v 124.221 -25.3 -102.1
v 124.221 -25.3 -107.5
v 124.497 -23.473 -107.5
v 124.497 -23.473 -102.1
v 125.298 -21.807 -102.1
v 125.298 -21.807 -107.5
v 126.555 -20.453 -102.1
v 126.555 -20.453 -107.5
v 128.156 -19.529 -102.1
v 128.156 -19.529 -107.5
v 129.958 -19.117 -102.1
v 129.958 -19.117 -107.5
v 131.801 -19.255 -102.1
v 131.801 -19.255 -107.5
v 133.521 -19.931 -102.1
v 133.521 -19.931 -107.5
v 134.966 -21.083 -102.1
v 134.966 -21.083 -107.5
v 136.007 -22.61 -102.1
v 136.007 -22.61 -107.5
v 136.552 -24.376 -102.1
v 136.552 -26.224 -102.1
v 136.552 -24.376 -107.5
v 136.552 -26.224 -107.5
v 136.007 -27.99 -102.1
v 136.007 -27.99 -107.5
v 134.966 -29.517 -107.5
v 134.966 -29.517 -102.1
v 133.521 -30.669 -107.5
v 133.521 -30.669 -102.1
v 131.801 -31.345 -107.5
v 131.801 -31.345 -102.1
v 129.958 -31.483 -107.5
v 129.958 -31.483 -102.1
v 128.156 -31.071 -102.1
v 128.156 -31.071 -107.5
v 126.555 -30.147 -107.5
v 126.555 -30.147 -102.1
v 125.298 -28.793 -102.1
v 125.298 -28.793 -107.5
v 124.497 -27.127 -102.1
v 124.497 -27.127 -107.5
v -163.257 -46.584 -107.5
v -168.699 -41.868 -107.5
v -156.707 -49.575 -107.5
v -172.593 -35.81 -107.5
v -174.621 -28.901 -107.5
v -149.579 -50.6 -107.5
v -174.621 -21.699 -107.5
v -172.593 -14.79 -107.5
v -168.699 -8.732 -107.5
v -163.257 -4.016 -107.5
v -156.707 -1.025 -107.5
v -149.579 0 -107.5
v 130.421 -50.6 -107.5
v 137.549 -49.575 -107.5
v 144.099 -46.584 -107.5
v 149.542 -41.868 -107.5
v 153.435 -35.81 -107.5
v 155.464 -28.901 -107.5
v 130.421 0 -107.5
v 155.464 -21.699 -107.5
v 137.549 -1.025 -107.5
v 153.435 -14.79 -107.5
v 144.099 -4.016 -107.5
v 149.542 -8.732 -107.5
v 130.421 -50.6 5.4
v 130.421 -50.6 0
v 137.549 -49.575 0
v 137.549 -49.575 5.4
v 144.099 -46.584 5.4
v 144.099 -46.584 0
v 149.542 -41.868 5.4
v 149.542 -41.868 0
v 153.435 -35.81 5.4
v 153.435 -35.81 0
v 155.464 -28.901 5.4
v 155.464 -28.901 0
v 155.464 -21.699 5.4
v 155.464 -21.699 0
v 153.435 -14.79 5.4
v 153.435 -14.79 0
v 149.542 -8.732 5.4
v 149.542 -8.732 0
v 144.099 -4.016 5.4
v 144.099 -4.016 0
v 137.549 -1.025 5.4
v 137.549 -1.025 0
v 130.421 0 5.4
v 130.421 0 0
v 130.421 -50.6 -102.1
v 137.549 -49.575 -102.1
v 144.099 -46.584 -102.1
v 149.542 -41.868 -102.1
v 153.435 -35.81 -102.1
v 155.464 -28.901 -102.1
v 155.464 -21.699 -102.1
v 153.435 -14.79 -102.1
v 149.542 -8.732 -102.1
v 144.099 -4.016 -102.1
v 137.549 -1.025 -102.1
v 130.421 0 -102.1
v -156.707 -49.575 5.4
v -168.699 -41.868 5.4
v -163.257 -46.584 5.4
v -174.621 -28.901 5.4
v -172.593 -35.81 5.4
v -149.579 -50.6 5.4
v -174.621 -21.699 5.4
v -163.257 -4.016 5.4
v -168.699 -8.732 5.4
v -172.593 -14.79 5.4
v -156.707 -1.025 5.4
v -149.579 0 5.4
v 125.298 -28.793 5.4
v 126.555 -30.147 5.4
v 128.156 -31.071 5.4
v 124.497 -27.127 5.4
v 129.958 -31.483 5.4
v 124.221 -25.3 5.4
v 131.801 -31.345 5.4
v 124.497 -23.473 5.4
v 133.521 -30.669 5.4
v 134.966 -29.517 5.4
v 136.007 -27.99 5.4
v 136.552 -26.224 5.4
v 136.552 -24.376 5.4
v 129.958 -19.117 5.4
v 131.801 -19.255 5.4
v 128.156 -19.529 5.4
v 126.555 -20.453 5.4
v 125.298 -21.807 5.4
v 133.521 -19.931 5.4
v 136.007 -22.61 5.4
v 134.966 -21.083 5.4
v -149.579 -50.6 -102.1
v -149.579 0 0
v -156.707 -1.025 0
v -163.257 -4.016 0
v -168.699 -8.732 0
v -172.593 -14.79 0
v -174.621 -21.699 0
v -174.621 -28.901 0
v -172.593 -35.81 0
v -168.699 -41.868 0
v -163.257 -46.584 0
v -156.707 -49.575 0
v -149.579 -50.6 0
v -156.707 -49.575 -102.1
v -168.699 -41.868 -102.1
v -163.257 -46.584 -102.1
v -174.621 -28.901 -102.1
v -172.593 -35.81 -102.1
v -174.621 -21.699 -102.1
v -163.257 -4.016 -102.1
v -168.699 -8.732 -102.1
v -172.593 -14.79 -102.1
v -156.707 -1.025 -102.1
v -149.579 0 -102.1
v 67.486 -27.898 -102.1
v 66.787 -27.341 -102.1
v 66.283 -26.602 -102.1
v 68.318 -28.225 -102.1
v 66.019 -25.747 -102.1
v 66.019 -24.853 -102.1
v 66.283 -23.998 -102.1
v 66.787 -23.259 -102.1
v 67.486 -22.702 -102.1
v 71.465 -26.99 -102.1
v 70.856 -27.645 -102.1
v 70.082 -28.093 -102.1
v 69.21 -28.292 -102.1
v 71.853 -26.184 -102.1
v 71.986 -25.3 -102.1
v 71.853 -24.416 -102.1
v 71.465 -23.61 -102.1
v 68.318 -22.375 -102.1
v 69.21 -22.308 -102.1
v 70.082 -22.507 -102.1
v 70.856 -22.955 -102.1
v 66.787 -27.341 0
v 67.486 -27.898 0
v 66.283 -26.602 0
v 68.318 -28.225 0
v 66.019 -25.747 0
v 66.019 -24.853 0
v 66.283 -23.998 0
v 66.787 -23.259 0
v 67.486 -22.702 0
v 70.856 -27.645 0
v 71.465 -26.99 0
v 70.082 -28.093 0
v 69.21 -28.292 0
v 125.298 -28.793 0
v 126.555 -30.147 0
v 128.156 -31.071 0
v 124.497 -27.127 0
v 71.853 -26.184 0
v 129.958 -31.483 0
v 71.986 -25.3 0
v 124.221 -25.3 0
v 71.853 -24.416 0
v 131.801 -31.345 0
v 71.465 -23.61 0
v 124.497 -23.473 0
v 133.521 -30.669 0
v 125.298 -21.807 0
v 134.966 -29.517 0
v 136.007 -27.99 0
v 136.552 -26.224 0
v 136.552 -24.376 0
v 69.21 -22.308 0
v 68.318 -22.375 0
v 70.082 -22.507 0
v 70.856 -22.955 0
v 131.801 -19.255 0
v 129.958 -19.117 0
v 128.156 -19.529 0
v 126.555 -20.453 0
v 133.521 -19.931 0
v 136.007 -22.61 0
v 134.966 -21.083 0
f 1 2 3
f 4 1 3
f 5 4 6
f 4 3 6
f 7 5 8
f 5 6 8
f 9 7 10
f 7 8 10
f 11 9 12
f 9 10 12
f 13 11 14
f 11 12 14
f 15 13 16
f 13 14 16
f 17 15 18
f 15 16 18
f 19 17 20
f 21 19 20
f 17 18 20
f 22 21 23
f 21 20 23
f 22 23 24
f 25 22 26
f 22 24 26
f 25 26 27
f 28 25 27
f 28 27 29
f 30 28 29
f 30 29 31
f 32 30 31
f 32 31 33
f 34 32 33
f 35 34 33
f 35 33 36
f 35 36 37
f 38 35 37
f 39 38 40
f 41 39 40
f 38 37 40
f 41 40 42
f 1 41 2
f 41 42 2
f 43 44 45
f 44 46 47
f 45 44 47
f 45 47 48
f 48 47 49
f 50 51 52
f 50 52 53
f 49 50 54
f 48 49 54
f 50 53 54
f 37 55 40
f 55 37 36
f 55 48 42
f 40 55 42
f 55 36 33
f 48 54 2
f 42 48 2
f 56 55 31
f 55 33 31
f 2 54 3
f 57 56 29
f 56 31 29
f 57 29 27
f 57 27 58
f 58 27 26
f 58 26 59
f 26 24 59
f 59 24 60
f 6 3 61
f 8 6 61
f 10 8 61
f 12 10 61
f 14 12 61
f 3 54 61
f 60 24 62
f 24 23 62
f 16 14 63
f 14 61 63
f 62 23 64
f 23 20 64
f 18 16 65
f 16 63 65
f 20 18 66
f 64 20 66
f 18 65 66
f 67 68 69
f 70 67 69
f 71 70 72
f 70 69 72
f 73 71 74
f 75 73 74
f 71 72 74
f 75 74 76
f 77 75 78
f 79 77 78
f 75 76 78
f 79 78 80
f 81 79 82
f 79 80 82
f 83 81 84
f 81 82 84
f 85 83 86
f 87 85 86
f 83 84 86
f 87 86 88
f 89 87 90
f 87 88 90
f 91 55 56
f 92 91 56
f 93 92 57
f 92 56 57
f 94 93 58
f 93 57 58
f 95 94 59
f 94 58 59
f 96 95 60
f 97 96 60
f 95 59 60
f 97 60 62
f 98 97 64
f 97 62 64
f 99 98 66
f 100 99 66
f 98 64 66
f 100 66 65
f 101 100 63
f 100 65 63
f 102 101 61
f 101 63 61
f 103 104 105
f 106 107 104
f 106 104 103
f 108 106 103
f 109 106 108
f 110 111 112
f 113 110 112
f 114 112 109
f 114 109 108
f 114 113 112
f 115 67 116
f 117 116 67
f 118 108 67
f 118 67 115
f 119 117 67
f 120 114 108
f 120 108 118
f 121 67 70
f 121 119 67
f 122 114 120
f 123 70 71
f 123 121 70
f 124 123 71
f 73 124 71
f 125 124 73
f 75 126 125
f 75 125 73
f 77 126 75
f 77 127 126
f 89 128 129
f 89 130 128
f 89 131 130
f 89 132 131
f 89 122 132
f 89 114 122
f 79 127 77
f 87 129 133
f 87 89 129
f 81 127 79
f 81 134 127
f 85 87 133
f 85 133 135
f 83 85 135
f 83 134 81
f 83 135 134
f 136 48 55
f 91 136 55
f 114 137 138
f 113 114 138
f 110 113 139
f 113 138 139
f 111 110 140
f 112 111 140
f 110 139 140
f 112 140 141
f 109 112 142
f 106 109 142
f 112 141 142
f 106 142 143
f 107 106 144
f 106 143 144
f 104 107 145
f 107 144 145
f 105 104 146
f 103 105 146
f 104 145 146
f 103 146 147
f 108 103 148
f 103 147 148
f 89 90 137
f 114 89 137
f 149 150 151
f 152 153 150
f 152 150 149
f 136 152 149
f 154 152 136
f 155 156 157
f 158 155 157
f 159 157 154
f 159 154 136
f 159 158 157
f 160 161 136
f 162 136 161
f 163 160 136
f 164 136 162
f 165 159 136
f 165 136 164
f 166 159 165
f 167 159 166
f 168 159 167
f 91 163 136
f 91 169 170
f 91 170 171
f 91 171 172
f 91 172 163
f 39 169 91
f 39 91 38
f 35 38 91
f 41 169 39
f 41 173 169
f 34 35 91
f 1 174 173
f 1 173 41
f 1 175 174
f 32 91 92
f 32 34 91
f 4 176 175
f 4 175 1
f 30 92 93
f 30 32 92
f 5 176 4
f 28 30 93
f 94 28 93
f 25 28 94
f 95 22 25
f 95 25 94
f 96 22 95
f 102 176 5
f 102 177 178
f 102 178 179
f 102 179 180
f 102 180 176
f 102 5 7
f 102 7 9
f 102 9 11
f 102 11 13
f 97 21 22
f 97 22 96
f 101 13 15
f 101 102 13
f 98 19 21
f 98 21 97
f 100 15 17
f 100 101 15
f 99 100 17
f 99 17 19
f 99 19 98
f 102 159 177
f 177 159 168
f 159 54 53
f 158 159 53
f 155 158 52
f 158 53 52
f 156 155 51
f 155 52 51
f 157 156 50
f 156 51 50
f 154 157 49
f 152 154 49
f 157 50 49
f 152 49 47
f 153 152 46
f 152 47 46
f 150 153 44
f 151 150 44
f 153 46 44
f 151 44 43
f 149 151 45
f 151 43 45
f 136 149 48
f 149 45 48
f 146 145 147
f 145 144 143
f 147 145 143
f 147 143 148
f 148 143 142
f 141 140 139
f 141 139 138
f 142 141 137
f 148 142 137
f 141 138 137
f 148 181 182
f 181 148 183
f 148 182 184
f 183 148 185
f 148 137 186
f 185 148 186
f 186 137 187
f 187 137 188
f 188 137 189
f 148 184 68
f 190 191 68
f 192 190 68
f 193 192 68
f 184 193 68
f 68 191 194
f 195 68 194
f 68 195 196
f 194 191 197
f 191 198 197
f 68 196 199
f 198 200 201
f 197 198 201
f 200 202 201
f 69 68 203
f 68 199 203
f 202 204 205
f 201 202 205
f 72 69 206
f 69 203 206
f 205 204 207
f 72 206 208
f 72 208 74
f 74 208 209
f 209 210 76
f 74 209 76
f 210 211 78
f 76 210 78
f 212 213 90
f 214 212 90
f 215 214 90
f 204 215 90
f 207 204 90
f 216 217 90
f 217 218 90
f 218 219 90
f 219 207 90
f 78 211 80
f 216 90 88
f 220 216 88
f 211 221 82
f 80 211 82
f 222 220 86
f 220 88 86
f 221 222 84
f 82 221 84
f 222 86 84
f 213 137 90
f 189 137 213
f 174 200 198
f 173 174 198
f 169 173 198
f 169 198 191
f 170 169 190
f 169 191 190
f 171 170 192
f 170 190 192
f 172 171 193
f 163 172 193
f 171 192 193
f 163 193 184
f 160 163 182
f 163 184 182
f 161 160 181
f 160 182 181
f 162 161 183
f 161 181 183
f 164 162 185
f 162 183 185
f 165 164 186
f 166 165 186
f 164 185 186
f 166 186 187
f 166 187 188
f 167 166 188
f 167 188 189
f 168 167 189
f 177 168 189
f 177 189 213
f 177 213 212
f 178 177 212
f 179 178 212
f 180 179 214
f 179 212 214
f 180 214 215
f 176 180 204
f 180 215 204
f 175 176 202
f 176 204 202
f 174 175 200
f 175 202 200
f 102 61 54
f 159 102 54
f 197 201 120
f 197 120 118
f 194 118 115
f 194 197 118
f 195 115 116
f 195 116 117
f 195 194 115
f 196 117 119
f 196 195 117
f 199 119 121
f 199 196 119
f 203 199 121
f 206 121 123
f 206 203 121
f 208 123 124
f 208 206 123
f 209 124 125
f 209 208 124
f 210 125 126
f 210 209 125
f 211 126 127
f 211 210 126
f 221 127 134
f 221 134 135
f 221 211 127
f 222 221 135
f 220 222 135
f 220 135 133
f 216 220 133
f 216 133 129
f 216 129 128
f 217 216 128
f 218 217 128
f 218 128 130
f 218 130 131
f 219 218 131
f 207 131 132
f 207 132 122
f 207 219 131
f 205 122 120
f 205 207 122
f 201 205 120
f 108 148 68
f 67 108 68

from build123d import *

# Parameters (mm, degrees)
SKETCH1_R           = 6.2
BOSS_EXTRUDE1_DEPTH = 5.4
SKETCH2_R           = 3
BOSS_EXTRUDE3_DEPTH = 102.1
BOSS_EXTRUDE4_START = 5.4
SKETCH4_R           = 6.2
BOSS_EXTRUDE4_DEPTH = 5.4


with BuildPart() as part:
    # Sketch1 → Boss-Extrude1 (new body)
    with BuildSketch(Plane.XY):
        with BuildLine():
            Line((0, 0), (-149.578947368, 0))
            ThreePointArc((-149.578947368, 0), (-174.878947368, -25.3), (-149.578947368, -50.6))
            Line((-149.578947368, -50.6), (130.421052632, -50.6))
            ThreePointArc((130.421052632, -50.6), (155.721052632, -25.3), (130.421052632, 0))
            Line((130.421052632, 0), (0, 0))
        make_face()
        with Locations(Location((130.421052632, -25.3, 0), (0, 0, 180))):
            Circle(SKETCH1_R, mode=Mode.SUBTRACT)
    extrude(amount=BOSS_EXTRUDE1_DEPTH)

    # Sketch2 → Boss-Extrude3 (add)
    with BuildSketch(Plane(origin=(0, 0, 0), x_dir=(-1, 0, 0), z_dir=(0, 0, -1))):
        with Locations(Location((-68.985809966, -25.3, 0), (0, 0, 180))):
            Circle(SKETCH2_R)
    extrude(amount=BOSS_EXTRUDE3_DEPTH)

    # Sketch4 → Boss-Extrude4 (add)
    with BuildSketch(Plane(origin=(0, 0, -102.1), x_dir=(-1, 0, 0), z_dir=(0, 0, -1)).offset(BOSS_EXTRUDE4_START)):
        with BuildLine():
            Line((-130.421052632, 0), (149.578947368, 0))
            ThreePointArc((149.578947368, 0), (174.878947368, -25.3), (149.578947368, -50.6))
            Line((149.578947368, -50.6), (-130.421052632, -50.6))
            ThreePointArc((-130.421052632, -50.6), (-155.721052632, -25.3), (-130.421052632, 0))
        make_face()
        with Locations((-130.421052632, -25.3)):
            Circle(SKETCH4_R, mode=Mode.SUBTRACT)
    extrude(amount=-BOSS_EXTRUDE4_DEPTH)


solid = part.part
